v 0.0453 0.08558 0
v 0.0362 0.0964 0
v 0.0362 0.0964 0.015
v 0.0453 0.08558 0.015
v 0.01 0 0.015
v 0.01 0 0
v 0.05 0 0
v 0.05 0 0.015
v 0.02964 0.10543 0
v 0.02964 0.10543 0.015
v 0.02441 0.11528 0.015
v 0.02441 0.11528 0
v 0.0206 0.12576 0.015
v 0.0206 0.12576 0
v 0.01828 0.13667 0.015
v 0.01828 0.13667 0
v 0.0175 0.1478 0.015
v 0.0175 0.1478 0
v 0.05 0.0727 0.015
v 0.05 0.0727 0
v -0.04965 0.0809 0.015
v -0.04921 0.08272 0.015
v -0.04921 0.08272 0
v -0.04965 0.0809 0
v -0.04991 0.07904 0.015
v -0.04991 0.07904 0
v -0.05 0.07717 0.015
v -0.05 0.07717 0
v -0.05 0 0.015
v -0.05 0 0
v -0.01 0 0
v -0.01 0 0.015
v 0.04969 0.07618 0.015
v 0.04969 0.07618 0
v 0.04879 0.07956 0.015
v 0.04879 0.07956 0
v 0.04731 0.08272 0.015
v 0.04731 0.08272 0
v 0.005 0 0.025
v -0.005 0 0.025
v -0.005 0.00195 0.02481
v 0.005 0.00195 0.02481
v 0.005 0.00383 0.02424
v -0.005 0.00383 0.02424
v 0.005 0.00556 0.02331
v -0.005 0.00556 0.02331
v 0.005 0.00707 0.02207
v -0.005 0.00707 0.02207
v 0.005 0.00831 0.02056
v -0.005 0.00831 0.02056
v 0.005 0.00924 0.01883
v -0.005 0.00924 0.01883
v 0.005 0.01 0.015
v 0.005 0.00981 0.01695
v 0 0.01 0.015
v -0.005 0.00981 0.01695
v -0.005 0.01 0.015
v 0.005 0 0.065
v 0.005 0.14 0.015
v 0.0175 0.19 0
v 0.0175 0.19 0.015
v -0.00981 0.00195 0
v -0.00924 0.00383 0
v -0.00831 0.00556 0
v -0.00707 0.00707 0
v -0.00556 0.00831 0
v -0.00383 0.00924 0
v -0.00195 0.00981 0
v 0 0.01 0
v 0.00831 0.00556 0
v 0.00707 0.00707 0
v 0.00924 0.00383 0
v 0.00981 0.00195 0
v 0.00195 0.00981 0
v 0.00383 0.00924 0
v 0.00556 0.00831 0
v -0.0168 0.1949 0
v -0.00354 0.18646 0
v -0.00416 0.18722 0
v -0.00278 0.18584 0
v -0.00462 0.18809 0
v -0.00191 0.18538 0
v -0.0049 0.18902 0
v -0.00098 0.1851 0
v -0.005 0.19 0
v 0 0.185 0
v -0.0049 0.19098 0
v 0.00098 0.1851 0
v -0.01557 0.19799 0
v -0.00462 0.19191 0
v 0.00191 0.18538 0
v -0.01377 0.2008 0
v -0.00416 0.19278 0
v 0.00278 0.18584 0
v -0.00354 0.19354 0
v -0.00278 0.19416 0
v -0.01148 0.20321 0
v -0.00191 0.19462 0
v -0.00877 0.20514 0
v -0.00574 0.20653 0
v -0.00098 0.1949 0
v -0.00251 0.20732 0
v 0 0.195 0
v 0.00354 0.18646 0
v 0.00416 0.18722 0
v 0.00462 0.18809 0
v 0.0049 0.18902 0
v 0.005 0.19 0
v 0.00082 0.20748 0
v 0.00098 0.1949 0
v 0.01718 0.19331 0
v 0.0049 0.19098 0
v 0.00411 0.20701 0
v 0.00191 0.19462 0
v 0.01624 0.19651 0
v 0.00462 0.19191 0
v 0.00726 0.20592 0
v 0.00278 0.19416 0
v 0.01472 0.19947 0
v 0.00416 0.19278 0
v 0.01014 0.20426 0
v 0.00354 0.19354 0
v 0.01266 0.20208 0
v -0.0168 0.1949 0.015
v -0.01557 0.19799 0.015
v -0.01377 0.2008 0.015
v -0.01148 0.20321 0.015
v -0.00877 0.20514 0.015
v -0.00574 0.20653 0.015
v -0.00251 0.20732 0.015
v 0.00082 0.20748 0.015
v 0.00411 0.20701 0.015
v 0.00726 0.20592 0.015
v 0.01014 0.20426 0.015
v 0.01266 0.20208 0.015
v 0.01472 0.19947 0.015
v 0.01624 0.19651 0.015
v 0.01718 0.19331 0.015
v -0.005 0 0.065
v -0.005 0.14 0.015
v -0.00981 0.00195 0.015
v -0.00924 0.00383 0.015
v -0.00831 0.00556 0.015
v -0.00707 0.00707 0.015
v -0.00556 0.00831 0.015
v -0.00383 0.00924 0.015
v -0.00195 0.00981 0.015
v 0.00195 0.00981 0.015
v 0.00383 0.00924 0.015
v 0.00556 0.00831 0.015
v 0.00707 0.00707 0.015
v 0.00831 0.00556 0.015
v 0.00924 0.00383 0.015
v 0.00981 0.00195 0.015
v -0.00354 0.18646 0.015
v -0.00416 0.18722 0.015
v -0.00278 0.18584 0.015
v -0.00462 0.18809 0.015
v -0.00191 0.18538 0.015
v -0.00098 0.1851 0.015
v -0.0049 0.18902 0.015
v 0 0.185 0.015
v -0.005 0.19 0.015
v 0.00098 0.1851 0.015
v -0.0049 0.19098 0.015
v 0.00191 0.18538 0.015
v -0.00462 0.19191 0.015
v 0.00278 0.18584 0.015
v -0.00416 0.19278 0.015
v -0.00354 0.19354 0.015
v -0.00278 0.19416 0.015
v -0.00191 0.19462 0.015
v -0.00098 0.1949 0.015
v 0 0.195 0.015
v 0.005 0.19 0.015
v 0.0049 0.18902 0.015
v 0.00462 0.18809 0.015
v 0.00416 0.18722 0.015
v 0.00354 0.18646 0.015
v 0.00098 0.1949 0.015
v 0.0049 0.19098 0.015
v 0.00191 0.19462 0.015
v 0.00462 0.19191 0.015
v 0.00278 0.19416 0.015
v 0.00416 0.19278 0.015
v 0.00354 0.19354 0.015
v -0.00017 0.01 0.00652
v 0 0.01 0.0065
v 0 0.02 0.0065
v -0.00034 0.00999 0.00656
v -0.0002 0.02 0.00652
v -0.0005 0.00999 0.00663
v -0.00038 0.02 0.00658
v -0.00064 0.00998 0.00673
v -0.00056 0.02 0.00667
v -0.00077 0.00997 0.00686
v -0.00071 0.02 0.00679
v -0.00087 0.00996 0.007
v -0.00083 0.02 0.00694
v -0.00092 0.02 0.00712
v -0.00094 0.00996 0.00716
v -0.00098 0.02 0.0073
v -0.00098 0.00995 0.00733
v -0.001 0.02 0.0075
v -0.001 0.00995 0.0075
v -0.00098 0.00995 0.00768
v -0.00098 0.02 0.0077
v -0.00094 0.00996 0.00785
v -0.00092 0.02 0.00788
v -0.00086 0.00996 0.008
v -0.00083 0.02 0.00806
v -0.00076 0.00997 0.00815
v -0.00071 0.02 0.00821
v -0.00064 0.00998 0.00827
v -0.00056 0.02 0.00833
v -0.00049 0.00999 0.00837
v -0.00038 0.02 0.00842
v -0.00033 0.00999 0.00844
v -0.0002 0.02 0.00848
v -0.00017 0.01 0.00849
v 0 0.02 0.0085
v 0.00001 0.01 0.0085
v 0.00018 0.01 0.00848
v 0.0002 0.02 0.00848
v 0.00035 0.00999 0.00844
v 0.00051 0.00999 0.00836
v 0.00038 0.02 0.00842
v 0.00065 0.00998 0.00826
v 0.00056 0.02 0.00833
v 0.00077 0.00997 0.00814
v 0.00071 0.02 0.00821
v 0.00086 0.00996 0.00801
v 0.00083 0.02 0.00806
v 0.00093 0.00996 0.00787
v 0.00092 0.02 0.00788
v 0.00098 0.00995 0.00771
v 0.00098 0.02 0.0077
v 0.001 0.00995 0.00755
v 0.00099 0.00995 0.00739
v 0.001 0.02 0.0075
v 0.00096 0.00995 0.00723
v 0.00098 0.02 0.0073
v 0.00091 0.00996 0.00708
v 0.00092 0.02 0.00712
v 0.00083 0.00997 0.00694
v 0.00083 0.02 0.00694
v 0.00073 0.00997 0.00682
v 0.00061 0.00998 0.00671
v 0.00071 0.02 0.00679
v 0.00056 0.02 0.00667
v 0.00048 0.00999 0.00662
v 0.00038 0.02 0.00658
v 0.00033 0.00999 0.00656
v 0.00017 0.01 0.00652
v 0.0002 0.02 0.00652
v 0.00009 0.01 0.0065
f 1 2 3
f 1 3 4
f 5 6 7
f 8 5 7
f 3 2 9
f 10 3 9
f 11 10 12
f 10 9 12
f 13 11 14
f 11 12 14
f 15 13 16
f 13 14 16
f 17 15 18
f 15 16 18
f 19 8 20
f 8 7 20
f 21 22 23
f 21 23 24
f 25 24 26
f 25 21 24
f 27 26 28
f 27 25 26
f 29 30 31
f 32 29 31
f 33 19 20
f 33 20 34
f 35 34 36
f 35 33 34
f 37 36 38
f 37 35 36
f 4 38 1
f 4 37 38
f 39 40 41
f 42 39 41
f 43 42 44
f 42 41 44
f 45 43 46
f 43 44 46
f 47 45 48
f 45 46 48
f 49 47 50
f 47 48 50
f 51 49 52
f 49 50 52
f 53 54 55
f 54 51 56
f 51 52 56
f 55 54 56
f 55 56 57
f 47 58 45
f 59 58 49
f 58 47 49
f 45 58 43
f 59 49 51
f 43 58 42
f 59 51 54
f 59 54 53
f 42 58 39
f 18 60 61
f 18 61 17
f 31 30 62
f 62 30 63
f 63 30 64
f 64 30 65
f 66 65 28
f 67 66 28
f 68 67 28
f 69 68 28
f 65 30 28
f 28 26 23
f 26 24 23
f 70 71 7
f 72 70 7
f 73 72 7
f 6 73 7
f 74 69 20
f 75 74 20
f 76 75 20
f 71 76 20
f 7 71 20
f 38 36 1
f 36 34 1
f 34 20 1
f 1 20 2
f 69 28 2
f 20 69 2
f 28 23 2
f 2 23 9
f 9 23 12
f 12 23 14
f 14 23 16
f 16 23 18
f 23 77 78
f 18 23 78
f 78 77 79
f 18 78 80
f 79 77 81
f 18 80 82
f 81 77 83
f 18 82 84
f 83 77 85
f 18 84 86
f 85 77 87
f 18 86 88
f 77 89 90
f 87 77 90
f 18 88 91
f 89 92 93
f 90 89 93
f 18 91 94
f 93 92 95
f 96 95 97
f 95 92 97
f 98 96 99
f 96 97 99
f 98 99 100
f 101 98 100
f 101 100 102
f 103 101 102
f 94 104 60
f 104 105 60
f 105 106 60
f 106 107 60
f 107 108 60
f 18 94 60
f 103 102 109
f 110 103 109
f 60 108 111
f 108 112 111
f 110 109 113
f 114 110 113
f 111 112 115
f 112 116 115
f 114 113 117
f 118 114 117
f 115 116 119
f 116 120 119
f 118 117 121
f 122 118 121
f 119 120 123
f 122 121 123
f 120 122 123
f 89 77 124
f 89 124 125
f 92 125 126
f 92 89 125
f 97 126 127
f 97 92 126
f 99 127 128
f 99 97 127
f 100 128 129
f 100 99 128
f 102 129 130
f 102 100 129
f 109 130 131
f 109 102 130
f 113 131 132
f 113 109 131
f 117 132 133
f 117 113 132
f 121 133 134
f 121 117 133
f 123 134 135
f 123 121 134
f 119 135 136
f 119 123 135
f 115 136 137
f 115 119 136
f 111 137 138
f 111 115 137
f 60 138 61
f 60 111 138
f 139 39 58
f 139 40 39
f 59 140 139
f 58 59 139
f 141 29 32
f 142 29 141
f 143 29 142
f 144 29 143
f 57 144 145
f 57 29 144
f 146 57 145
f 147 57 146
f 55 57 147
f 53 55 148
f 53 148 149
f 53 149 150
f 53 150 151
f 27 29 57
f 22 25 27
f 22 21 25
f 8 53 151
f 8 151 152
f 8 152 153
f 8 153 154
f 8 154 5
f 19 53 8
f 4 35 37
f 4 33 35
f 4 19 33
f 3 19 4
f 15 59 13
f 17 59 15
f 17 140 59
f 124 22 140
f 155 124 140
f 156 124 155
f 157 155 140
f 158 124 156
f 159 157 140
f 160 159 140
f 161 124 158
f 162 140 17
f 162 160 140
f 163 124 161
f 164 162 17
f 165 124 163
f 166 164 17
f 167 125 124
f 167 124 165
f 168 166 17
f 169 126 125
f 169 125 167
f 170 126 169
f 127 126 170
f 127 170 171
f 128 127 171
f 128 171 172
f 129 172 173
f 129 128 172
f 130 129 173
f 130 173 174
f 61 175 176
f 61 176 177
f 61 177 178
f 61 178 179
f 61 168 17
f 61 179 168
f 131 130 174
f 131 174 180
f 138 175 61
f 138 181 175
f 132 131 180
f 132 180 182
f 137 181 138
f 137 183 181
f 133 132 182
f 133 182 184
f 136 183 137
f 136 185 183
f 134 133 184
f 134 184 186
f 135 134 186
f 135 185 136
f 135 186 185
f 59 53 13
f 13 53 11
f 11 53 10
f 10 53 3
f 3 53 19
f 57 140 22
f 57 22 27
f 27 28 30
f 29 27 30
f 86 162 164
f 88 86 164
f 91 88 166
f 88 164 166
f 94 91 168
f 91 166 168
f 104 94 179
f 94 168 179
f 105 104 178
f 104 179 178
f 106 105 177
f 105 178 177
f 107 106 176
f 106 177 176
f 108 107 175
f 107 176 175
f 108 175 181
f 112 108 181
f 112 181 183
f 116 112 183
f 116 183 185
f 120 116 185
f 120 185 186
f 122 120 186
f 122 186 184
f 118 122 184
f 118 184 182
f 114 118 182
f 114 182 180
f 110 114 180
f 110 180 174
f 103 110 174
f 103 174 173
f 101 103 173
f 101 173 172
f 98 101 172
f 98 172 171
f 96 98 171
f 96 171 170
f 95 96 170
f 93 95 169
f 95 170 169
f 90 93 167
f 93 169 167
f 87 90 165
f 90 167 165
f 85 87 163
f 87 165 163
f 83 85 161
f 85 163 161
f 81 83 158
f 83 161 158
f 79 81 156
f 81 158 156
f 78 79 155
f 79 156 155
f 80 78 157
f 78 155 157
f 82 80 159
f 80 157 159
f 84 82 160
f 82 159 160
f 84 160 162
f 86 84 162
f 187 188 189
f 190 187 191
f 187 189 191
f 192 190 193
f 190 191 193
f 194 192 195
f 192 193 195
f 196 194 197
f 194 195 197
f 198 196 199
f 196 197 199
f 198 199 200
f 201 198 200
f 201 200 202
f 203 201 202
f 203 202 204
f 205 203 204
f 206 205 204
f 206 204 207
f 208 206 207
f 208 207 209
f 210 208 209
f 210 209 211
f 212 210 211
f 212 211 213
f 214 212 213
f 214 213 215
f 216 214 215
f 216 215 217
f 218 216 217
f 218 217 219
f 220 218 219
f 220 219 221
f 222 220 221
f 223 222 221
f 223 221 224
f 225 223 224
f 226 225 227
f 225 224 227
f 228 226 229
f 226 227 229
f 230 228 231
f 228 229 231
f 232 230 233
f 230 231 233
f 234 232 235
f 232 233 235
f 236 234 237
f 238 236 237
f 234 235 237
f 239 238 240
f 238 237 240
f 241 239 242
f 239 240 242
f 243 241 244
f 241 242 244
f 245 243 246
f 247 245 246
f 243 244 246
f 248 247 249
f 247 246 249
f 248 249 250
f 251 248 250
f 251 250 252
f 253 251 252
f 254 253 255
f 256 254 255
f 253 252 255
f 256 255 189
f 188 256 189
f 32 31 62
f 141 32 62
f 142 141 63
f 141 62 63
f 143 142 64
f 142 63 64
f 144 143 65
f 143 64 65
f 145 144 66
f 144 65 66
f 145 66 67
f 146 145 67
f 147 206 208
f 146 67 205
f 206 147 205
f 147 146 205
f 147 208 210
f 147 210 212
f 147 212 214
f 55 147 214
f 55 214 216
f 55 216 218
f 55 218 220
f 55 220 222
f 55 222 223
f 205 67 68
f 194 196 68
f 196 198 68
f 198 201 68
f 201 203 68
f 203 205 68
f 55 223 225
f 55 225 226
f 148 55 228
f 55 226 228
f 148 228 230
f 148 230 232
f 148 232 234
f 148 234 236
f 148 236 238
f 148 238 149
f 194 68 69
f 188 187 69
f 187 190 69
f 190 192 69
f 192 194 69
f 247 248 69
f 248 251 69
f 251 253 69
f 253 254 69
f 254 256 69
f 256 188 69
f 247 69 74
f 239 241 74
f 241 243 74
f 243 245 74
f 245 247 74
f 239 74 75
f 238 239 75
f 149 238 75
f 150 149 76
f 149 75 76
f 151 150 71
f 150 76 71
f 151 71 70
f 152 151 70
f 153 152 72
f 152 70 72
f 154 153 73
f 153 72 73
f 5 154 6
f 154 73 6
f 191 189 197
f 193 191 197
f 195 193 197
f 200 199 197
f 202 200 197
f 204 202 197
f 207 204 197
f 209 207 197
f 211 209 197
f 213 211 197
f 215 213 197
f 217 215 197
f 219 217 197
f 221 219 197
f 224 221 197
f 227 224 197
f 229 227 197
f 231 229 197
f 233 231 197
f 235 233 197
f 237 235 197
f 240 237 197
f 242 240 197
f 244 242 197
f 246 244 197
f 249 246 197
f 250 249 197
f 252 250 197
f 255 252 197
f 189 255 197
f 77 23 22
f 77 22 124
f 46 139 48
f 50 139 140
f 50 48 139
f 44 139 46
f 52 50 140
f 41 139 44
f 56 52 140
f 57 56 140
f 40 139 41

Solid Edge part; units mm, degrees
sketch "Sketch1" plane through (0, 0, 0) normal (0, 0, 1) x (1, 0, 0)
  line L0 (-0.05, 0) -> (0.05, 0)
  line L1 (0.05, 0) -> (0.05, 0.08)
  line L2 (0.0362, 0.0964) -> (0.05, 0.08)
  line L3 (0.0175, 0.19) -> (0.0175, 0.1478)
  line L4 (-0.05, 0.08) -> (-0.0168, 0.1949)
  line L5 (-0.05, 0.08) -> (-0.05, 0)
  arc A0 (0.0362, 0.0964) -> (0.0175, 0.1478) centre (0.0975, 0.1478) cw
  arc A1 (0.0175, 0.19) -> (-0.0168, 0.1949) centre (0, 0.19) ccw
  dimension "D1" = 0.05
  dimension "D2" = 0.05
extrude "Protrusion1" add sketch "Sketch1" along normal blind 0.015
hole "Bohrung_1" at (0, 0, 0.0075) direction (0, 1, 0) diameter 0.002 depth 0.02
hole "Bohrung_2" at (0, 0.19, 0.015) direction (0, 0, -1) diameter 0.01 end through all
hole "Bohrung_3" at (0, 0, 0.015) direction (0, 0, -1) diameter 0.02 depth 3.175
sketch "Sketch2" plane through (0, 0, 0) normal (1, 0, 0) x (0, 1, 0)
  line L0 (0.14, 0.015) -> (0.01, 0.015)
  line L1 (0, 0.025) -> (0, 0.065)
  line L2 (0.14, 0.015) -> (0, 0.065)
  arc A0 (0.01, 0.015) -> (0, 0.025) centre (0, 0.015) ccw
extrude "Ausprägung_2" add sketch "Sketch2" along normal mid plane 0.01
fillet "Verrundung_1" radius 0.02 2 edges at (0.05, 0.08, 0.0075) (-0.05, 0.08, 0.0075)
